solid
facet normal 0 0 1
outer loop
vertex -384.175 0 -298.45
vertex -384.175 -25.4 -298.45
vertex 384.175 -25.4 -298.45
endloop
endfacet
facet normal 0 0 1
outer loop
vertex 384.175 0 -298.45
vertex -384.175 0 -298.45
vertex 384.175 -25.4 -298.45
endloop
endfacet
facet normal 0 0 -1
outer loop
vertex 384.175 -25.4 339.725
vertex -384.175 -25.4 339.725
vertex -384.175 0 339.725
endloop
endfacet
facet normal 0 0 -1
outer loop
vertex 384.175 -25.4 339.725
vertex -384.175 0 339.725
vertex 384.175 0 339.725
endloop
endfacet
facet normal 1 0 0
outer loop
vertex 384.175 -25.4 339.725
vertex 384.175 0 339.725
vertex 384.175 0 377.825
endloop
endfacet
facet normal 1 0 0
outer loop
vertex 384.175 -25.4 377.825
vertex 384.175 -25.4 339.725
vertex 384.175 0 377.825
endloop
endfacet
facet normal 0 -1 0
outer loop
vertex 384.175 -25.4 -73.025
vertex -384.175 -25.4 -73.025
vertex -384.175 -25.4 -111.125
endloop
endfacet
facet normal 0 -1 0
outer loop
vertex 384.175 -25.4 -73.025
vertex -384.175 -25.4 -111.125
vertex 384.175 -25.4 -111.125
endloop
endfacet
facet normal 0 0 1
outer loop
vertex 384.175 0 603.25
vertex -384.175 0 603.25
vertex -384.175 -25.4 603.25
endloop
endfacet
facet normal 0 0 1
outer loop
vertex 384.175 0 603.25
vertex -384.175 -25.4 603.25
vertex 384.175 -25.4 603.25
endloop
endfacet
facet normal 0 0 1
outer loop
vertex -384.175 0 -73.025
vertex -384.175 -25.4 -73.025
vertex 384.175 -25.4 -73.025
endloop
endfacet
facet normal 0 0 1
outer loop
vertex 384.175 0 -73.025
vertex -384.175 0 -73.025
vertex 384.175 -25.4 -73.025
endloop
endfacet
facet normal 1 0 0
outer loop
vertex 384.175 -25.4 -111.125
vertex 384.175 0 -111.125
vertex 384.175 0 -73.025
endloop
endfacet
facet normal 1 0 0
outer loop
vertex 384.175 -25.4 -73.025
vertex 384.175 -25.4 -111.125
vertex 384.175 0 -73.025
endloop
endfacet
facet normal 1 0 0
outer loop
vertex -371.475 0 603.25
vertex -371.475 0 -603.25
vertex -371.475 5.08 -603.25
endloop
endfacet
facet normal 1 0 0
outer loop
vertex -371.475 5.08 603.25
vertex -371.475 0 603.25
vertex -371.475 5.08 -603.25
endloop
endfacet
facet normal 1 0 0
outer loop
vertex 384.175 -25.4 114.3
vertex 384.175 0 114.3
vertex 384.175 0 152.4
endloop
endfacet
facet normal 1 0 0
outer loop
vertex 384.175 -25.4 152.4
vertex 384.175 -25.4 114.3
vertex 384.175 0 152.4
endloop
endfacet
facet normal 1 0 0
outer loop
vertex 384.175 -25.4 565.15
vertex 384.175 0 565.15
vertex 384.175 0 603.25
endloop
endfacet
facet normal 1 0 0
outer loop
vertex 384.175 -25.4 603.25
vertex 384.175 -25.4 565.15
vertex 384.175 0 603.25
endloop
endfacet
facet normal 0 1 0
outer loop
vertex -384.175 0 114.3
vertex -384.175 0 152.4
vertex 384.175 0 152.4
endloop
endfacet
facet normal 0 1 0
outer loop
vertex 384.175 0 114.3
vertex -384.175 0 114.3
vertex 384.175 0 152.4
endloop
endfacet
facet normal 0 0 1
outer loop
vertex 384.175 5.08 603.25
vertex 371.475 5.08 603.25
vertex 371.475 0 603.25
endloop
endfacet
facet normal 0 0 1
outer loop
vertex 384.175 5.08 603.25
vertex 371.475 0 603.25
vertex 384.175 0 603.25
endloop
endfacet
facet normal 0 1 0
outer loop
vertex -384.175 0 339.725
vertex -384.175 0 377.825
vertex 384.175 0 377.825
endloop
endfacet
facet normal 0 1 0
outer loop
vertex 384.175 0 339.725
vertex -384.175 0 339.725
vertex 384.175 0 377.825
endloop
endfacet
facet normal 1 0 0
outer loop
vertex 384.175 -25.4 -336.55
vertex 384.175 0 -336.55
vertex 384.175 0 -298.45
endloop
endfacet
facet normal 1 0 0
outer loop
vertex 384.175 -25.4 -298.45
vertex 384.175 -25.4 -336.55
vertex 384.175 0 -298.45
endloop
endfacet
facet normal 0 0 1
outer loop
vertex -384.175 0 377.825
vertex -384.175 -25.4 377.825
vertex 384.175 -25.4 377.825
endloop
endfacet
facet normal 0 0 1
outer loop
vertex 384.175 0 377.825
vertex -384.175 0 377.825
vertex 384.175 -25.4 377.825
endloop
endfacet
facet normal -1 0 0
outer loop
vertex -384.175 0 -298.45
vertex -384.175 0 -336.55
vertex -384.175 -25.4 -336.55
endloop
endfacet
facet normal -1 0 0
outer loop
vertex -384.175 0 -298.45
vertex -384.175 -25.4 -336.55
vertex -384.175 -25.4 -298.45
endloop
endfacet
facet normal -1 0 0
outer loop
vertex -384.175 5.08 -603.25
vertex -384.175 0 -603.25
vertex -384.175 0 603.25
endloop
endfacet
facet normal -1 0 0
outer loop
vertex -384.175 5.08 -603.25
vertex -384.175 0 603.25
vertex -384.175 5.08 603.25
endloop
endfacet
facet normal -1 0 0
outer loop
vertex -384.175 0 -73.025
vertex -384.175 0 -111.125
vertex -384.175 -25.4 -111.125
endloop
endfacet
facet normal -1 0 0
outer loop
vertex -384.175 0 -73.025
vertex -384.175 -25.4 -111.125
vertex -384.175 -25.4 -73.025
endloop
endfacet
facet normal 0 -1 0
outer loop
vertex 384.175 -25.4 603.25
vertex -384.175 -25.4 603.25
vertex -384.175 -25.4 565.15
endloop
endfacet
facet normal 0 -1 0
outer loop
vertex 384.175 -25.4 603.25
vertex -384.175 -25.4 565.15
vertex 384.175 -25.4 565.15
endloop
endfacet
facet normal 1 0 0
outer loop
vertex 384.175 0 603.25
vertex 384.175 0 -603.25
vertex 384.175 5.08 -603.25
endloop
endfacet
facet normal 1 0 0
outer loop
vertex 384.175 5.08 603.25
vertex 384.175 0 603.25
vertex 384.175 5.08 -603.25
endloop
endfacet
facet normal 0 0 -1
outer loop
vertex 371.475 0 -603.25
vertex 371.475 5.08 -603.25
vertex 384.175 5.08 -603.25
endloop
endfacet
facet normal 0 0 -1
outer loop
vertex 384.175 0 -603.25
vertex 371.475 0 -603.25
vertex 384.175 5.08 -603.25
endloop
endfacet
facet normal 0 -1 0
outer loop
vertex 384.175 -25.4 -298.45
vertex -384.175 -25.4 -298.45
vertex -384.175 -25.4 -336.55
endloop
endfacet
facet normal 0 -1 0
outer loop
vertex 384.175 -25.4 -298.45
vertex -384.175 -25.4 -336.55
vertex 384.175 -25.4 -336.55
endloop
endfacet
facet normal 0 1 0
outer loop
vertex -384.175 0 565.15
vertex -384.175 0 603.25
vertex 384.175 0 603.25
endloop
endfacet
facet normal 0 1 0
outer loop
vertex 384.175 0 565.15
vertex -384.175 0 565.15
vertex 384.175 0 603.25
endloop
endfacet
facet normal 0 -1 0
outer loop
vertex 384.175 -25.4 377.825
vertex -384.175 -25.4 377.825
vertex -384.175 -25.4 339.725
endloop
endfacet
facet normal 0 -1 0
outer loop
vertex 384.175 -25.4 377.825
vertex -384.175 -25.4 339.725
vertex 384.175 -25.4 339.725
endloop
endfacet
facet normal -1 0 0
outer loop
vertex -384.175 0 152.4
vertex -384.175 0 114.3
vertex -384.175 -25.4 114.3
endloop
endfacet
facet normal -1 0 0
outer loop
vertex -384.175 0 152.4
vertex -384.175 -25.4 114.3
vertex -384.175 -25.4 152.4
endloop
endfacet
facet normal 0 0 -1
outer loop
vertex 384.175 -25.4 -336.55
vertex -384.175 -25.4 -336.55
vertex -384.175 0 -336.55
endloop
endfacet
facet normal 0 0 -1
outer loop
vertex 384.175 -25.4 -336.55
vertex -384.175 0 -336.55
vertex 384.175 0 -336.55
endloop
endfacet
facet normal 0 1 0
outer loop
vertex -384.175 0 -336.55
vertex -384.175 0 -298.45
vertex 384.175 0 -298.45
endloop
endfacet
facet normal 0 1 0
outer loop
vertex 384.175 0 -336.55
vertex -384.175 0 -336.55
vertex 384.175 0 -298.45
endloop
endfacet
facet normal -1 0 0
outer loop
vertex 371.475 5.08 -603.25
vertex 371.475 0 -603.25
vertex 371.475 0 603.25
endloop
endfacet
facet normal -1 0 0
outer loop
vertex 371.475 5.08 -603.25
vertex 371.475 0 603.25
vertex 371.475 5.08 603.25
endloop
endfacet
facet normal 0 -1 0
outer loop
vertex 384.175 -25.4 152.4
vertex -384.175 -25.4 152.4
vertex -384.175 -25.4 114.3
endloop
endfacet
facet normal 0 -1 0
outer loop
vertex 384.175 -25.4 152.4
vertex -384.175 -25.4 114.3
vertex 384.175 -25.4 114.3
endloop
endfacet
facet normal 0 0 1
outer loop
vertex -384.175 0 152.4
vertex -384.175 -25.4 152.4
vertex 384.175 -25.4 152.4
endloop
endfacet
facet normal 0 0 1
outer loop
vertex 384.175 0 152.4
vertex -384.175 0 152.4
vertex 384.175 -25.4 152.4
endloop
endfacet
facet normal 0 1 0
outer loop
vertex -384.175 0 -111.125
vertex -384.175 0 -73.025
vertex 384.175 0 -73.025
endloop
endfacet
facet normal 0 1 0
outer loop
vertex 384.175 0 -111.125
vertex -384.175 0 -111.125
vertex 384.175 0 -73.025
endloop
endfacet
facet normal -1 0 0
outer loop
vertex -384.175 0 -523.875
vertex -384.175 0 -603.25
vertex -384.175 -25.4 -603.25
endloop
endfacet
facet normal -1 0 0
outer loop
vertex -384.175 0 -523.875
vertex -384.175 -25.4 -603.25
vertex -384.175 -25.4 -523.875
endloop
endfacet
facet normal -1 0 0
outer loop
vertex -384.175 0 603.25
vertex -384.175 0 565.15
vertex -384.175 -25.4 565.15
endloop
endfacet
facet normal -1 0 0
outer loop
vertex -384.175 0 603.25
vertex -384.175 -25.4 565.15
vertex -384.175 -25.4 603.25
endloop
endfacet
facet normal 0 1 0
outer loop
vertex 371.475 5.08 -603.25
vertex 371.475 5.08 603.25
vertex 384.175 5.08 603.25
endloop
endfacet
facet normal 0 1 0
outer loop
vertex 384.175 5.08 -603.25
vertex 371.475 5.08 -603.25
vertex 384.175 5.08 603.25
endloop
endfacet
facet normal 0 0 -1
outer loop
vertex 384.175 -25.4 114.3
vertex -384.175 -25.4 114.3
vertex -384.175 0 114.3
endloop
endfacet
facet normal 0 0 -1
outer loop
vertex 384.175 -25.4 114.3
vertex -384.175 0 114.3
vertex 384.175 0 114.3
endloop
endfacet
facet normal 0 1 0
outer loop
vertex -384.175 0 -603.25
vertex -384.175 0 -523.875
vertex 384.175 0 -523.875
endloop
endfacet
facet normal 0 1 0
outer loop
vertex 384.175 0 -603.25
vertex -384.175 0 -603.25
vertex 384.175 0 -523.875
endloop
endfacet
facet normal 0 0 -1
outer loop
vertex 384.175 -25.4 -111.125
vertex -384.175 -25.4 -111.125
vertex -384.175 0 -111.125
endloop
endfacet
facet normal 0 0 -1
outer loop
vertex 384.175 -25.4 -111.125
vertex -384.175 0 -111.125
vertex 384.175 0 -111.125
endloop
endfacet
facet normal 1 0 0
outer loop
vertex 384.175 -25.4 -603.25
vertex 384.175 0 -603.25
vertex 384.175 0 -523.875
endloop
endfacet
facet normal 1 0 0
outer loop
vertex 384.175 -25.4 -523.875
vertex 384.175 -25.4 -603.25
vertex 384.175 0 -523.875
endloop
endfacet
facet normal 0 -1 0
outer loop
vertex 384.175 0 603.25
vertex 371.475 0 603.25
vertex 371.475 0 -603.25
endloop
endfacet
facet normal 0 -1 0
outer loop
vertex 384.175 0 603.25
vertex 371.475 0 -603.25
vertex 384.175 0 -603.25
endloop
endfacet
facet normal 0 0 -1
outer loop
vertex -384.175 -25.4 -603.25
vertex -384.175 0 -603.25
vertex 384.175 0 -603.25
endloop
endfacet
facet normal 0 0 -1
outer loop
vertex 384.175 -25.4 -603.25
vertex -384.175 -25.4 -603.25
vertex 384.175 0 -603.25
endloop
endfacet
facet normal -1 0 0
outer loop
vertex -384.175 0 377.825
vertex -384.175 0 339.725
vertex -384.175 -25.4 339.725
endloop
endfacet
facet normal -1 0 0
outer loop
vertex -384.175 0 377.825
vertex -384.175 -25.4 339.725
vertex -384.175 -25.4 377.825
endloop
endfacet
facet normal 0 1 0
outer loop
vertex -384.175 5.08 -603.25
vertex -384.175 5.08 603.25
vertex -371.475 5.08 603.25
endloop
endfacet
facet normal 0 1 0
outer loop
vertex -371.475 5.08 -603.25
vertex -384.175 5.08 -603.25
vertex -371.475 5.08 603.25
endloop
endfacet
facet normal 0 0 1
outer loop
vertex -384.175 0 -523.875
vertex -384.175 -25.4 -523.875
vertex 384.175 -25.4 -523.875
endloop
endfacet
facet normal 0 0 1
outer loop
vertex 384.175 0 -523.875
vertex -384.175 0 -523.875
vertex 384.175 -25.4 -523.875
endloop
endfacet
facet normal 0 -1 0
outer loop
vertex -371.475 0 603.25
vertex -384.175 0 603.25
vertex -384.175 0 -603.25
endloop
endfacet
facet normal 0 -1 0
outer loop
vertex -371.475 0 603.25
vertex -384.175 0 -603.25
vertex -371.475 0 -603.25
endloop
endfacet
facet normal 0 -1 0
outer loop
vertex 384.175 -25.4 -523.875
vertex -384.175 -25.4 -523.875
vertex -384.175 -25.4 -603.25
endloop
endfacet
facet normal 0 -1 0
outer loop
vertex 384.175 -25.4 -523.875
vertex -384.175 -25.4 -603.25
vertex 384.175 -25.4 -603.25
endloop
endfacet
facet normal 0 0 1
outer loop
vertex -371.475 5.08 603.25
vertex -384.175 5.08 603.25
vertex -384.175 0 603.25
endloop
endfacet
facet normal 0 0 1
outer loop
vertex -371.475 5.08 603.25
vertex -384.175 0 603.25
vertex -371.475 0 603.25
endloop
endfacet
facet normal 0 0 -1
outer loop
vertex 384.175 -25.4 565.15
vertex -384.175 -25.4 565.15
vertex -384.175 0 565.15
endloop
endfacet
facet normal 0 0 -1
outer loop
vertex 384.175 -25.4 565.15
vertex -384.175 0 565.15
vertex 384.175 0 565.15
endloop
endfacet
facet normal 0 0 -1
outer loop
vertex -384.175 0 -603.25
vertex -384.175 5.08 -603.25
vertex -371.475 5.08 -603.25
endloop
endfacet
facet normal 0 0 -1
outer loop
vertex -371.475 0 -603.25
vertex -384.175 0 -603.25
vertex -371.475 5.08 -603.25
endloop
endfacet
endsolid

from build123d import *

# Parameters (mm, degrees)
F0_W     = 768.35
F0_H     = 1206.5
F1_DEPTH = 25.4
F2_W     = 768.35
F2_H     = 187.325
F3_DEPTH = 25.4
F4_W     = 12.7
F4_H     = 5.08
F5_DEPTH = 1206.5


with BuildPart() as f1:
    # F0 (on Front) → F1 (new body)
    with BuildSketch(Plane.XZ):
        Rectangle(F0_W, F0_H)
    extrude(amount=F1_DEPTH)

    # F2 (on face) → F3 (cut)
    with BuildSketch(Plane.XZ.offset(25.4)):
        with Locations((0, 471.4875)):
            Rectangle(F2_W, F2_H)
        with Locations((0, 246.0625)):
            Rectangle(F2_W, F2_H)
        with Locations((0, -430.2125)):
            Rectangle(F2_W, F2_H)
        with Locations((0, 20.6375)):
            Rectangle(F2_W, F2_H)
        with Locations((0, -204.7875)):
            Rectangle(F2_W, F2_H)
    extrude(amount=-F3_DEPTH, mode=Mode.SUBTRACT)


with BuildPart() as f5:
    # F4 (on face) → F5 (new body, through all)
    with BuildSketch(Plane.XY.offset(603.25)):
        with Locations((-377.825, 2.54)):
            Rectangle(F4_W, F4_H)
        with Locations((377.825, 2.54)):
            Rectangle(F4_W, F4_H)
    extrude(amount=-F5_DEPTH)


solid = Compound([f1.part, f5.part])
